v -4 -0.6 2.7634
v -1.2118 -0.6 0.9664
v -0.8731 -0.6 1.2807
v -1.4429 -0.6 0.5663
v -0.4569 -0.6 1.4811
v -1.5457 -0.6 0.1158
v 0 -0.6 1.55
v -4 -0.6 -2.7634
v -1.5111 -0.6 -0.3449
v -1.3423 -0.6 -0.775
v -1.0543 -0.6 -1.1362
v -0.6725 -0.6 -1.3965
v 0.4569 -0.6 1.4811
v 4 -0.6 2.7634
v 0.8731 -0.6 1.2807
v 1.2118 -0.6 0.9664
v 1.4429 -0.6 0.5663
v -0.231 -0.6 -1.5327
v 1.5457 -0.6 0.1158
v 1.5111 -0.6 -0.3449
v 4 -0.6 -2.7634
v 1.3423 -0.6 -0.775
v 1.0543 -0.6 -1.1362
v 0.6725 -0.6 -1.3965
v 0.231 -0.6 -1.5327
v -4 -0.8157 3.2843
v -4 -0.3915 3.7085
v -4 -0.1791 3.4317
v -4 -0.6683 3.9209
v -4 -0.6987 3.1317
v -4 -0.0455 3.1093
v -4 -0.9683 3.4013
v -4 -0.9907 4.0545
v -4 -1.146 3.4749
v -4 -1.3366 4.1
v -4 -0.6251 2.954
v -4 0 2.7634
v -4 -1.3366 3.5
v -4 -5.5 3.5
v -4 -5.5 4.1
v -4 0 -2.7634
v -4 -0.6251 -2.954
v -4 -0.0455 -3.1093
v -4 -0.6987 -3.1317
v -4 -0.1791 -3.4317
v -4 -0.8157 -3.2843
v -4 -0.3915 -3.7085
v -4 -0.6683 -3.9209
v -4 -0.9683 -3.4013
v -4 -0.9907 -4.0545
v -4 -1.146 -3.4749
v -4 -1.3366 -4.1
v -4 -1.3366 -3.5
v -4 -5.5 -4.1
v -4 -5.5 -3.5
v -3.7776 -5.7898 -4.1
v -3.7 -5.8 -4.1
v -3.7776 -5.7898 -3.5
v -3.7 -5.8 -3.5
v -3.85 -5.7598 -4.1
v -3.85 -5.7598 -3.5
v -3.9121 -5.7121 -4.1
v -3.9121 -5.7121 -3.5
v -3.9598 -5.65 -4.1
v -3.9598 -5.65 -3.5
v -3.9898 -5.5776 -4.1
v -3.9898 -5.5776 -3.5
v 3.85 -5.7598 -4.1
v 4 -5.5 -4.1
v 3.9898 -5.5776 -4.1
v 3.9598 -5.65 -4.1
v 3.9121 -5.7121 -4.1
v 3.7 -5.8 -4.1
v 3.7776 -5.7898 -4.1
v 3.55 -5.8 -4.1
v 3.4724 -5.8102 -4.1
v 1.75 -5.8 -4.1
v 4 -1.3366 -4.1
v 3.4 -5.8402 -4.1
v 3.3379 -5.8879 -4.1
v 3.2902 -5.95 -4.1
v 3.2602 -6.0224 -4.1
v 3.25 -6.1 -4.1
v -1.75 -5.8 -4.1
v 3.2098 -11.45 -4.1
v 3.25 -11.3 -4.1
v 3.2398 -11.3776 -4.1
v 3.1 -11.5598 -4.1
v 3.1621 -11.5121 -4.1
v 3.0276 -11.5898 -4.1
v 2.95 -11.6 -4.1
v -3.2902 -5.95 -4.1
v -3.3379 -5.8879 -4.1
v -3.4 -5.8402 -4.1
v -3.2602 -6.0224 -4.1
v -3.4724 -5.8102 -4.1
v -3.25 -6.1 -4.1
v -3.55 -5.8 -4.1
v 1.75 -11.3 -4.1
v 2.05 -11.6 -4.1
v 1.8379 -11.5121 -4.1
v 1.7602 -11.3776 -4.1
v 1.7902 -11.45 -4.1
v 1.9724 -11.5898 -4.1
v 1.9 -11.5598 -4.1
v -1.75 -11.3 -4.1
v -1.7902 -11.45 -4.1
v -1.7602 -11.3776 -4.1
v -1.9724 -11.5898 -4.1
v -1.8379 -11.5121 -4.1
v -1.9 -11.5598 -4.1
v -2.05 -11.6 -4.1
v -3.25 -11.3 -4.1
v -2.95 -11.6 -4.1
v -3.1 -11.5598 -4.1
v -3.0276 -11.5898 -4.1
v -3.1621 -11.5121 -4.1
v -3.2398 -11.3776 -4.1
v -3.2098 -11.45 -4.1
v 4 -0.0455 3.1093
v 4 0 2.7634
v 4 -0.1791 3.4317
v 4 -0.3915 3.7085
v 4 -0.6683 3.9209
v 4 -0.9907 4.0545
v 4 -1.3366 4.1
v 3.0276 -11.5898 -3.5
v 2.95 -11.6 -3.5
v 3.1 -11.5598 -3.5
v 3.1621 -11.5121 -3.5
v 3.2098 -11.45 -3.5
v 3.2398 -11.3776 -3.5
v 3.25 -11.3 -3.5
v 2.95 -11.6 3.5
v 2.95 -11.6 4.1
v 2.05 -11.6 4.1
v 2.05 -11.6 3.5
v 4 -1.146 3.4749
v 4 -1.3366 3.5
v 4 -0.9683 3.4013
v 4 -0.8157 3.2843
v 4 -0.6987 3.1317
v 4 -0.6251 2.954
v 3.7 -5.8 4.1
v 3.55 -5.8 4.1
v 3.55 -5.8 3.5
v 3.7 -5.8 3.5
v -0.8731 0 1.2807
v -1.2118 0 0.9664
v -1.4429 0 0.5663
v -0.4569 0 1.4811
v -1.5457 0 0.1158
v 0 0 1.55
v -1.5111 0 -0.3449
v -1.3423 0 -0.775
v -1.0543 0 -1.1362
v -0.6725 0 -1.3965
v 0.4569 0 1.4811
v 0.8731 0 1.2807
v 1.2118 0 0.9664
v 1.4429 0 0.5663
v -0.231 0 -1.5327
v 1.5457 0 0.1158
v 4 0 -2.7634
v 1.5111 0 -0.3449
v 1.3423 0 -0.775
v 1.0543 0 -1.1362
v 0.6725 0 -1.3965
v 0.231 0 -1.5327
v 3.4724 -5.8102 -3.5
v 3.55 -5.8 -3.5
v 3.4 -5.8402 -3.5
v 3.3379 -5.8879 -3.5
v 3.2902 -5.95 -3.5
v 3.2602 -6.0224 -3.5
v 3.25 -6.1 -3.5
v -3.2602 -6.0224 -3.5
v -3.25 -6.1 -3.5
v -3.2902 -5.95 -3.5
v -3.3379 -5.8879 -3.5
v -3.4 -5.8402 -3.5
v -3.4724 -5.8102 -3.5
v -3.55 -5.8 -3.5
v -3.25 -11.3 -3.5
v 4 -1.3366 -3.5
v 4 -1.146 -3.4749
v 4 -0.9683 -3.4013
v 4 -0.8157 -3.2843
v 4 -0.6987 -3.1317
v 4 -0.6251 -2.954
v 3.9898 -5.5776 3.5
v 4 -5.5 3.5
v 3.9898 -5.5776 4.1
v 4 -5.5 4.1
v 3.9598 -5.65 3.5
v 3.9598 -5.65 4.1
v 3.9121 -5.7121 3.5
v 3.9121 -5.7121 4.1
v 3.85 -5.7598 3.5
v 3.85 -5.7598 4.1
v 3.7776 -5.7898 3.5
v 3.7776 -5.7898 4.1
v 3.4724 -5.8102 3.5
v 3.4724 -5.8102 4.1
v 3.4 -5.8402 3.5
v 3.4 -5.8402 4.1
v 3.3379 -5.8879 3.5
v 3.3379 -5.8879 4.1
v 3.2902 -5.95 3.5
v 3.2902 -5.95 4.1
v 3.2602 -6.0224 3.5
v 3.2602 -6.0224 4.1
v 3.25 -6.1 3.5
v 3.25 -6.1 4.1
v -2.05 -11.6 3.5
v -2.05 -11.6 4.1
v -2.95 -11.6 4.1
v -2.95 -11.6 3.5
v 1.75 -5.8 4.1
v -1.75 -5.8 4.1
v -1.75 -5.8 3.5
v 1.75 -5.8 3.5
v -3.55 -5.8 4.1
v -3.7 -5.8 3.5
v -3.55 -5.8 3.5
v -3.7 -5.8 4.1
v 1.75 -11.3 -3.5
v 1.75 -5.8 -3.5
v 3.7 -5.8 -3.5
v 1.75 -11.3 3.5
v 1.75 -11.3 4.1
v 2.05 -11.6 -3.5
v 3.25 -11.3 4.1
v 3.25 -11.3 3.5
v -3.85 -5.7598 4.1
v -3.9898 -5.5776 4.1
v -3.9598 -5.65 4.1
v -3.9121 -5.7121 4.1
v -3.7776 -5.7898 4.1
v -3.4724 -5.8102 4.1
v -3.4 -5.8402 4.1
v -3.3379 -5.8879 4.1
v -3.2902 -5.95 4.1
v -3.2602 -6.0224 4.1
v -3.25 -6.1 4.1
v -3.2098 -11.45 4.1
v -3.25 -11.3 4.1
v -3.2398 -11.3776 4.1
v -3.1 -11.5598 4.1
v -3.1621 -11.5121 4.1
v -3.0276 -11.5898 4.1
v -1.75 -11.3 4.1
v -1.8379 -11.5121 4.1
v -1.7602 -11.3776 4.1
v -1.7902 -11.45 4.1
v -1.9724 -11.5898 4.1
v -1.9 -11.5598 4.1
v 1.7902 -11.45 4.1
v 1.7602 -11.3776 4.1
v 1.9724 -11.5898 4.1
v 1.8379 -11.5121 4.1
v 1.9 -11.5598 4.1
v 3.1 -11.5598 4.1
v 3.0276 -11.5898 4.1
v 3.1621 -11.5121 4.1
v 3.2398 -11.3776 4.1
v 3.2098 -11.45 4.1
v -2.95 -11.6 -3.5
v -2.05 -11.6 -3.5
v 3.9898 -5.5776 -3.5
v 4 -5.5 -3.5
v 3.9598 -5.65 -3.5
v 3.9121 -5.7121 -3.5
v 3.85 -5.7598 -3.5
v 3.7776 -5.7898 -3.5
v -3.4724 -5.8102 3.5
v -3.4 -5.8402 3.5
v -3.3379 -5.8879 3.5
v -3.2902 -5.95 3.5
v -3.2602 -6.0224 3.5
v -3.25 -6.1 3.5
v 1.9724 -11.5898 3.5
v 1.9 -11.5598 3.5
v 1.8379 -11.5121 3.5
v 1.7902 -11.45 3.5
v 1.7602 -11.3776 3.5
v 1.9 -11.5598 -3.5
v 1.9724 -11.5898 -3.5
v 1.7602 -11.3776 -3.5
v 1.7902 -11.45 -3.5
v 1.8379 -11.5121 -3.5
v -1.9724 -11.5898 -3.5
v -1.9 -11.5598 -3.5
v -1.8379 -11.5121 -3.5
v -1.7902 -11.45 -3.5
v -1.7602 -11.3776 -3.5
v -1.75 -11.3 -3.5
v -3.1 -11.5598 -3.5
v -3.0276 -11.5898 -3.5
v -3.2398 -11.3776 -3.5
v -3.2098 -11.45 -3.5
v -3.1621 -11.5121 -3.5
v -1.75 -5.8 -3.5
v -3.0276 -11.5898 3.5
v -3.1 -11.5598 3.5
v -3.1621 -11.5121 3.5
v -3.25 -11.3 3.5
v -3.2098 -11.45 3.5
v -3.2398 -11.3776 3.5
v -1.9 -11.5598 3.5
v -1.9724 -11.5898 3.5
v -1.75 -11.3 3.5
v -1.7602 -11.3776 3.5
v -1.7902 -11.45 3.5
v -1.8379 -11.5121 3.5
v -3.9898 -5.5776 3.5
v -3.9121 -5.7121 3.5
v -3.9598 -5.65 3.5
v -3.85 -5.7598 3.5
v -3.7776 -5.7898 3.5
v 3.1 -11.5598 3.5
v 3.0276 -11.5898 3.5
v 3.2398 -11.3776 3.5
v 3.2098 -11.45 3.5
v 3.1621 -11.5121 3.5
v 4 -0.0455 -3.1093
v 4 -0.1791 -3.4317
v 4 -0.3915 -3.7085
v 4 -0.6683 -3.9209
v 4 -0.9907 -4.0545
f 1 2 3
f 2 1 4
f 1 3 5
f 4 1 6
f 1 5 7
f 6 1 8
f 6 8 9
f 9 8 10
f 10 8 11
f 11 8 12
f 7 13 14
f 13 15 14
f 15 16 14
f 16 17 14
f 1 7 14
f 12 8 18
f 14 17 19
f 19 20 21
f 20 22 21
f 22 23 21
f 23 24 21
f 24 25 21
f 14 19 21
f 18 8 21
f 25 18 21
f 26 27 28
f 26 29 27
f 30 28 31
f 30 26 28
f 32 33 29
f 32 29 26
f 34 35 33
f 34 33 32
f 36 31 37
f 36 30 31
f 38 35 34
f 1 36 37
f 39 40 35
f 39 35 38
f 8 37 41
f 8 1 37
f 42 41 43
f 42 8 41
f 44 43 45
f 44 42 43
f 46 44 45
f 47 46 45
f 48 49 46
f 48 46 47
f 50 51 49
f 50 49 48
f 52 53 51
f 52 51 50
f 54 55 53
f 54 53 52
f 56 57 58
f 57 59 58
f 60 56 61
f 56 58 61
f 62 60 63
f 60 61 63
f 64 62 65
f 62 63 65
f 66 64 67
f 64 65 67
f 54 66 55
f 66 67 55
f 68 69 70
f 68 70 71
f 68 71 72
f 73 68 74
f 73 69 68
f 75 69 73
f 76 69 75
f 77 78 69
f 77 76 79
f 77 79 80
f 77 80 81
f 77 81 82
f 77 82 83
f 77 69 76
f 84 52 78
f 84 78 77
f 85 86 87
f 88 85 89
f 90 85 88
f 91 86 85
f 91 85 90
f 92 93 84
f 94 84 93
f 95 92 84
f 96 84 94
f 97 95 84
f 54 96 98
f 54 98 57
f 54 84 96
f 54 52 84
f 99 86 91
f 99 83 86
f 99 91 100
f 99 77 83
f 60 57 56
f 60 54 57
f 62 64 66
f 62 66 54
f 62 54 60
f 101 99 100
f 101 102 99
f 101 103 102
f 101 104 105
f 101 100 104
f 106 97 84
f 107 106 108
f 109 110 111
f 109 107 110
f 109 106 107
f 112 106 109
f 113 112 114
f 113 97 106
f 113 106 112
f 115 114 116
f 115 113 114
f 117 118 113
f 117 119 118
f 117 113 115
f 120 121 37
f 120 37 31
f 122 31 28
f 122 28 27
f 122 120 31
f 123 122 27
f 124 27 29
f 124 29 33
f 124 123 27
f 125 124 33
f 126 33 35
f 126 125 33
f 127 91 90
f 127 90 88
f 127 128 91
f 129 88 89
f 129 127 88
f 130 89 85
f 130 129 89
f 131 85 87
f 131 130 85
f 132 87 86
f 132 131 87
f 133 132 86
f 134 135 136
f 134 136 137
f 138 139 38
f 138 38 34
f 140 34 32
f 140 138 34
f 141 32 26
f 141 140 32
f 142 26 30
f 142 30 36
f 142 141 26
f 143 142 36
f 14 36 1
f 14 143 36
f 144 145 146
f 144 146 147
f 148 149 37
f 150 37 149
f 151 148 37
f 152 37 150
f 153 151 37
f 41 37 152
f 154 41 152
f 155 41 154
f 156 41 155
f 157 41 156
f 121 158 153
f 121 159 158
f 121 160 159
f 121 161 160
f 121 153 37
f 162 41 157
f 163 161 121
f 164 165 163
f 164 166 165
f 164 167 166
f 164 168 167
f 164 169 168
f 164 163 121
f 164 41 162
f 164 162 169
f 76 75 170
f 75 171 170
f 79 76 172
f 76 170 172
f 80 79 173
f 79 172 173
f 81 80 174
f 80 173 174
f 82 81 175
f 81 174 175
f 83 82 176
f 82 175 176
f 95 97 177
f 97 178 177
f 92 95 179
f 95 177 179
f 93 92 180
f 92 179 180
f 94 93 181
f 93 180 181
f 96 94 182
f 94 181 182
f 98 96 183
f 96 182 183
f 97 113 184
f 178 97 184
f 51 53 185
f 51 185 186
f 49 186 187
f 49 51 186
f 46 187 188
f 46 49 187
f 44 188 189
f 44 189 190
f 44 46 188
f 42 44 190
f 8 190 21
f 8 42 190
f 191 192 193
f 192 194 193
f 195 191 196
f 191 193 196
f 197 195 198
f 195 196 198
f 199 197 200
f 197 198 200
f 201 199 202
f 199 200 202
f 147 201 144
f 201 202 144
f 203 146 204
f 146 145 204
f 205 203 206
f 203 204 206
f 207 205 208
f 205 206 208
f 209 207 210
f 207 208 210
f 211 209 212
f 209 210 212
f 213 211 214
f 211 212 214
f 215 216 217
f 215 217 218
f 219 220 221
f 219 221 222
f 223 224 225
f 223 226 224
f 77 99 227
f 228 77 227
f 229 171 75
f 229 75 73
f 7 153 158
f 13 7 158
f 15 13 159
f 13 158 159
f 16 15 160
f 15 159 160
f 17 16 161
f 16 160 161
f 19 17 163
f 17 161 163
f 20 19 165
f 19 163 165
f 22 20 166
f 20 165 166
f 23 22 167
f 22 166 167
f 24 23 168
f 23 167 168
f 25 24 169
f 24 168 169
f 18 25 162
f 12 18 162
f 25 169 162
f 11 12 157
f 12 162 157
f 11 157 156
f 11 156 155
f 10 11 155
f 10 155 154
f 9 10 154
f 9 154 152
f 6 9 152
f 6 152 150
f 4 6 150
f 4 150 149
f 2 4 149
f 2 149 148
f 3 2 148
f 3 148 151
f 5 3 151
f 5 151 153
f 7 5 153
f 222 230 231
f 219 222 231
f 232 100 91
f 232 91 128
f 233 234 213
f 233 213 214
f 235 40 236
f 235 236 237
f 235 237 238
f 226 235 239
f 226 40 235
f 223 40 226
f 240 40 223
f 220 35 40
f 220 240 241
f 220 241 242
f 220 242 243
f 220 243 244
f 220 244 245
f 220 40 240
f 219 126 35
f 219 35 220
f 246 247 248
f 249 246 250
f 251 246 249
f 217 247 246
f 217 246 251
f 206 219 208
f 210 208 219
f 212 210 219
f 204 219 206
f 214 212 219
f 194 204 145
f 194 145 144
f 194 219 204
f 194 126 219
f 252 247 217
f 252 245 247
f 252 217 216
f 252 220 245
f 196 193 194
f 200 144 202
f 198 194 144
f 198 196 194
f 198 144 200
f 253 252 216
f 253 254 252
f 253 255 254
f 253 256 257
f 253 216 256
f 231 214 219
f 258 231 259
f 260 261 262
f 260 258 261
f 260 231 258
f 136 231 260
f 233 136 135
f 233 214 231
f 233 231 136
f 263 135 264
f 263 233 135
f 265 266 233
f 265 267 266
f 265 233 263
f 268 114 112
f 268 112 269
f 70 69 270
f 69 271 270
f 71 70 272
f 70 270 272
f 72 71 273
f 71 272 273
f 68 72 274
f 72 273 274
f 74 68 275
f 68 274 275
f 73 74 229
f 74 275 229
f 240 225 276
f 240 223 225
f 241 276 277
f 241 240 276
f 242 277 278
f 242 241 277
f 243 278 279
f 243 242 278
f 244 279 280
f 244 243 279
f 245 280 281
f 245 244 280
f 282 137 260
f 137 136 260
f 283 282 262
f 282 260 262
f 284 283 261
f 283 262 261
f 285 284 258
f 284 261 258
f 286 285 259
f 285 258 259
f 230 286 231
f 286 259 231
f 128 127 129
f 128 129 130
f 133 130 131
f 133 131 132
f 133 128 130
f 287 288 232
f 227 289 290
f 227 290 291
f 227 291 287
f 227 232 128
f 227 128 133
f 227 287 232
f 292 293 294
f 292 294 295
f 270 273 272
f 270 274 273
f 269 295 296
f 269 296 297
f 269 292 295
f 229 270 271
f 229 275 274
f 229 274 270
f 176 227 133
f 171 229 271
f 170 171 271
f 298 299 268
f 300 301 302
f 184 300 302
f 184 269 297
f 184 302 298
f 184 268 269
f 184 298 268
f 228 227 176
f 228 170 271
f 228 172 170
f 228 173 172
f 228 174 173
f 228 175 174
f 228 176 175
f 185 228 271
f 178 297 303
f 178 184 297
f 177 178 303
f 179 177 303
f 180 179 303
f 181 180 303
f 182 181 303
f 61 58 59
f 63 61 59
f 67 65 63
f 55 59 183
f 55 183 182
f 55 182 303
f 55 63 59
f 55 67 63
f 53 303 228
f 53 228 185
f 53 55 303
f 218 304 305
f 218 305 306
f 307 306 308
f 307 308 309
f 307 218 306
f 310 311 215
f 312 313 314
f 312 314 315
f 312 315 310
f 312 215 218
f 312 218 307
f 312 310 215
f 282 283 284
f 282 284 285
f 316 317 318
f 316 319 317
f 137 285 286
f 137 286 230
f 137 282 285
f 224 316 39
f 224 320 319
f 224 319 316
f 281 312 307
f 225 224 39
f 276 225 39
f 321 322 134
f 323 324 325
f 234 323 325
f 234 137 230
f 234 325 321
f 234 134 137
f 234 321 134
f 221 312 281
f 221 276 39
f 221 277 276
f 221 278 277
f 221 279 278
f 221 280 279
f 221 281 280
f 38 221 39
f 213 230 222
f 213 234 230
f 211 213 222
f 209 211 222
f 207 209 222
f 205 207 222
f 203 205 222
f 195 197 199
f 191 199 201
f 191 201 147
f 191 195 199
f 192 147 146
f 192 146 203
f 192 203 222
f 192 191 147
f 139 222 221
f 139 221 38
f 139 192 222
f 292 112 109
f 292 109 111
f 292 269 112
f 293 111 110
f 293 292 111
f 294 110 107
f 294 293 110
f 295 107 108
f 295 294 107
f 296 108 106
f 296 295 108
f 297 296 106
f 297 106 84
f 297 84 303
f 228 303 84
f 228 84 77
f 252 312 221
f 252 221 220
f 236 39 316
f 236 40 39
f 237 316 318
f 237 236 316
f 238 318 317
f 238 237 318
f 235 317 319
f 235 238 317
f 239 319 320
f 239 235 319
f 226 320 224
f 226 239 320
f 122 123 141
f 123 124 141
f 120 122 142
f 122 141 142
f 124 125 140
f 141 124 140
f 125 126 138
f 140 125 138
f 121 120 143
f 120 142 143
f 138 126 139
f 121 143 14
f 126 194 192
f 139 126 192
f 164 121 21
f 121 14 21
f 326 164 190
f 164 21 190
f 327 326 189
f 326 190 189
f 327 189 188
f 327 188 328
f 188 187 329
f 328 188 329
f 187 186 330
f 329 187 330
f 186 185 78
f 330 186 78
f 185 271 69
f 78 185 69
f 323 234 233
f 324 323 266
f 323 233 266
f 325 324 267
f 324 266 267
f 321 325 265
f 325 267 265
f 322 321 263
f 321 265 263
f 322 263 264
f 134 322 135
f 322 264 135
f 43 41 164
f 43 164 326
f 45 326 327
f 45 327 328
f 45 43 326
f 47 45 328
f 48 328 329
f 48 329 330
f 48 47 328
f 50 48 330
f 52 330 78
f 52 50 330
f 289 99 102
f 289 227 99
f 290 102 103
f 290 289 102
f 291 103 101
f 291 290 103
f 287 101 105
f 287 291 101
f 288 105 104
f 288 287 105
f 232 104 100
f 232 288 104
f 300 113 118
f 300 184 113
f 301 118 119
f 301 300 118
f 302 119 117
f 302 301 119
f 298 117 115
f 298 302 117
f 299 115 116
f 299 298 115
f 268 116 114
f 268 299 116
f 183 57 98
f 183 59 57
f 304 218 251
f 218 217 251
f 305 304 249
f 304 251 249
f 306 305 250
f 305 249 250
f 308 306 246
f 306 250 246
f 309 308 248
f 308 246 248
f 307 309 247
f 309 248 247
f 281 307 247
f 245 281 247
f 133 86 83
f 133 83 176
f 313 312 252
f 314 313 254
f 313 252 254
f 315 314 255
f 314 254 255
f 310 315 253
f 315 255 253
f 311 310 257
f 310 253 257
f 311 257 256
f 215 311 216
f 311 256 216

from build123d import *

# Parameters (mm, degrees)
SKETCH_1_W                         = 8
SKETCH_1_H                         = 8.2
SM_BASE_FLANGE_1_DEPTH             = 0.6
SM_EDGE_FLANGE_1_STRIP_W           = 3.8732
SM_EDGE_FLANGE_1_STRIP_H           = 0.6
SM_EDGE_FLANGE_1_STRIP_CUT_DEPTH   = 8
SM_EDGE_FLANGE_1_STRIP_2_W         = 3.8732
SM_EDGE_FLANGE_1_STRIP_2_H         = 0.6
SM_EDGE_FLANGE_1_STRIP_CUT_2_DEPTH = 8
SM_EDGE_FLANGE_1_DEPTH             = 8
SM_EDGE_FLANGE_1_BEND_DEPTH        = 8
SKETCH_10_OUTSIDE_W                = 13.26
SKETCH_10_OUTSIDE_H                = 13.46
SKETCH_10_OUTSIDE_W_2              = 1.5
SKETCH_10_OUTSIDE_H_2              = 9.508037294
CUT_EXTRUDE_1_DEPTH                = 5.8
FILLET_1_R                         = 0.3
FILLET_2_R                         = 0.3
SKETCH_11_R                        = 1.55
CUT_EXTRUDE_2_DEPTH                = 5.8


# Sheet-metal steps are written as plain solids
with BuildPart() as part:
    # Sketch 1 → 基体-法兰1 (new body)
    with BuildSketch(Plane(origin=(0, 0, 0), x_dir=(1, 0, 0), z_dir=(0, 1, 0))):
        Rectangle(SKETCH_1_W, SKETCH_1_H)
    extrude(amount=-SM_BASE_FLANGE_1_DEPTH)

    # 边线-法兰1 strip (across the edge) → 边线-法兰1 strip cut (cut)
    with BuildSketch(Plane(origin=(4, -0.6, 4.1), x_dir=(0, 0, -1), z_dir=(-1, 0, 0))):
        with Locations((-0.6, -0.3)):
            Rectangle(SM_EDGE_FLANGE_1_STRIP_W, SM_EDGE_FLANGE_1_STRIP_H)
    extrude(amount=SM_EDGE_FLANGE_1_STRIP_CUT_DEPTH, mode=Mode.SUBTRACT)

    # 边线-法兰1 strip 2 (across the edge) → 边线-法兰1 strip cut 2 (cut)
    with BuildSketch(Plane(origin=(-4, -0.6, -4.1), x_dir=(0, 0, 1), z_dir=(1, 0, 0))):
        with Locations((-0.6, -0.3)):
            Rectangle(SM_EDGE_FLANGE_1_STRIP_2_W, SM_EDGE_FLANGE_1_STRIP_2_H)
    extrude(amount=SM_EDGE_FLANGE_1_STRIP_CUT_2_DEPTH, mode=Mode.SUBTRACT)

    # 边线-法兰1 section (across the edge) → 边线-法兰1 (add)
    with BuildSketch(Plane(origin=(4, -0.6, 4.1), x_dir=(0, 0, -1), z_dir=(-1, 0, 0))):
        with BuildLine():
            Line((0, 0.7366), (0, 11))
            Line((0, 11), (0.6, 11))
            Line((0.6, 11), (0.6, 0.7366))
            ThreePointArc((0.6, 0.7366), (0.815745145, 0.215745145), (1.3366, 0))
            Line((1.3366, 0), (1.3366, -0.6))
            ThreePointArc((1.3366, -0.6), (0.391481076, -0.208518924), (0, 0.7366))
        make_face()
    extrude(amount=SM_EDGE_FLANGE_1_DEPTH)

    # 边线-法兰1 section 2 (across the edge) → 边线-法兰1 bend (add)
    with BuildSketch(Plane(origin=(-4, -0.6, -4.1), x_dir=(0, 0, 1), z_dir=(1, 0, 0))):
        with BuildLine():
            Line((0, 0.7366), (0, 11))
            Line((0, 11), (0.6, 11))
            Line((0.6, 11), (0.6, 0.7366))
            ThreePointArc((0.6, 0.7366), (0.815745145, 0.215745145), (1.3366, 0))
            Line((1.3366, 0), (1.3366, -0.6))
            ThreePointArc((1.3366, -0.6), (0.391481076, -0.208518924), (0, 0.7366))
        make_face()
    extrude(amount=SM_EDGE_FLANGE_1_BEND_DEPTH)

    # 草图10 outside → 切除-拉伸1 (cut)
    with BuildSketch(Plane.XZ.offset(11.6)):
        Rectangle(SKETCH_10_OUTSIDE_W, SKETCH_10_OUTSIDE_H)
        with Locations((-2.5, -0.421070223)):
            Rectangle(SKETCH_10_OUTSIDE_W_2, SKETCH_10_OUTSIDE_H_2, mode=Mode.SUBTRACT)
        with Locations((2.5, -0.421070223)):
            Rectangle(SKETCH_10_OUTSIDE_W_2, SKETCH_10_OUTSIDE_H_2, mode=Mode.SUBTRACT)
    extrude(amount=-CUT_EXTRUDE_1_DEPTH, mode=Mode.SUBTRACT)

    # 圆角1
    fillet_1_edges = [part.edges().sort_by_distance(p)[0] for p in [
        (-3.25, -11.6, 3.8),
        (-1.75, -11.6, 3.8),
        (3.25, -11.6, 3.8),
        (1.75, -11.6, 3.8),
        (1.75, -11.6, -3.8),
        (3.25, -11.6, -3.8),
        (-1.75, -11.6, -3.8),
        (-3.25, -11.6, -3.8),
    ]]
    fillet(fillet_1_edges, radius=FILLET_1_R)

    # 圆角2
    fillet_2_edges = [part.edges().sort_by_distance(p)[0] for p in [
        (3.25, -5.8, 3.8),
        (-3.25, -5.8, 3.8),
        (-3.25, -5.8, -3.8),
        (3.25, -5.8, -3.8),
        (-4, -5.8, 3.8),
        (-4, -5.8, -3.8),
        (4, -5.8, -3.8),
        (4, -5.8, 3.8),
    ]]
    fillet(fillet_2_edges, radius=FILLET_2_R)

    # 草图11 → 切除-拉伸2 (cut)
    with BuildSketch(Plane(origin=(0, 0, 0), x_dir=(1, 0, 0), z_dir=(0, 1, 0))):
        with Locations(Location((0, 0, 0), (0, 0, 270))):
            Circle(SKETCH_11_R)
    extrude(amount=-CUT_EXTRUDE_2_DEPTH, mode=Mode.SUBTRACT)


solid = part.part
